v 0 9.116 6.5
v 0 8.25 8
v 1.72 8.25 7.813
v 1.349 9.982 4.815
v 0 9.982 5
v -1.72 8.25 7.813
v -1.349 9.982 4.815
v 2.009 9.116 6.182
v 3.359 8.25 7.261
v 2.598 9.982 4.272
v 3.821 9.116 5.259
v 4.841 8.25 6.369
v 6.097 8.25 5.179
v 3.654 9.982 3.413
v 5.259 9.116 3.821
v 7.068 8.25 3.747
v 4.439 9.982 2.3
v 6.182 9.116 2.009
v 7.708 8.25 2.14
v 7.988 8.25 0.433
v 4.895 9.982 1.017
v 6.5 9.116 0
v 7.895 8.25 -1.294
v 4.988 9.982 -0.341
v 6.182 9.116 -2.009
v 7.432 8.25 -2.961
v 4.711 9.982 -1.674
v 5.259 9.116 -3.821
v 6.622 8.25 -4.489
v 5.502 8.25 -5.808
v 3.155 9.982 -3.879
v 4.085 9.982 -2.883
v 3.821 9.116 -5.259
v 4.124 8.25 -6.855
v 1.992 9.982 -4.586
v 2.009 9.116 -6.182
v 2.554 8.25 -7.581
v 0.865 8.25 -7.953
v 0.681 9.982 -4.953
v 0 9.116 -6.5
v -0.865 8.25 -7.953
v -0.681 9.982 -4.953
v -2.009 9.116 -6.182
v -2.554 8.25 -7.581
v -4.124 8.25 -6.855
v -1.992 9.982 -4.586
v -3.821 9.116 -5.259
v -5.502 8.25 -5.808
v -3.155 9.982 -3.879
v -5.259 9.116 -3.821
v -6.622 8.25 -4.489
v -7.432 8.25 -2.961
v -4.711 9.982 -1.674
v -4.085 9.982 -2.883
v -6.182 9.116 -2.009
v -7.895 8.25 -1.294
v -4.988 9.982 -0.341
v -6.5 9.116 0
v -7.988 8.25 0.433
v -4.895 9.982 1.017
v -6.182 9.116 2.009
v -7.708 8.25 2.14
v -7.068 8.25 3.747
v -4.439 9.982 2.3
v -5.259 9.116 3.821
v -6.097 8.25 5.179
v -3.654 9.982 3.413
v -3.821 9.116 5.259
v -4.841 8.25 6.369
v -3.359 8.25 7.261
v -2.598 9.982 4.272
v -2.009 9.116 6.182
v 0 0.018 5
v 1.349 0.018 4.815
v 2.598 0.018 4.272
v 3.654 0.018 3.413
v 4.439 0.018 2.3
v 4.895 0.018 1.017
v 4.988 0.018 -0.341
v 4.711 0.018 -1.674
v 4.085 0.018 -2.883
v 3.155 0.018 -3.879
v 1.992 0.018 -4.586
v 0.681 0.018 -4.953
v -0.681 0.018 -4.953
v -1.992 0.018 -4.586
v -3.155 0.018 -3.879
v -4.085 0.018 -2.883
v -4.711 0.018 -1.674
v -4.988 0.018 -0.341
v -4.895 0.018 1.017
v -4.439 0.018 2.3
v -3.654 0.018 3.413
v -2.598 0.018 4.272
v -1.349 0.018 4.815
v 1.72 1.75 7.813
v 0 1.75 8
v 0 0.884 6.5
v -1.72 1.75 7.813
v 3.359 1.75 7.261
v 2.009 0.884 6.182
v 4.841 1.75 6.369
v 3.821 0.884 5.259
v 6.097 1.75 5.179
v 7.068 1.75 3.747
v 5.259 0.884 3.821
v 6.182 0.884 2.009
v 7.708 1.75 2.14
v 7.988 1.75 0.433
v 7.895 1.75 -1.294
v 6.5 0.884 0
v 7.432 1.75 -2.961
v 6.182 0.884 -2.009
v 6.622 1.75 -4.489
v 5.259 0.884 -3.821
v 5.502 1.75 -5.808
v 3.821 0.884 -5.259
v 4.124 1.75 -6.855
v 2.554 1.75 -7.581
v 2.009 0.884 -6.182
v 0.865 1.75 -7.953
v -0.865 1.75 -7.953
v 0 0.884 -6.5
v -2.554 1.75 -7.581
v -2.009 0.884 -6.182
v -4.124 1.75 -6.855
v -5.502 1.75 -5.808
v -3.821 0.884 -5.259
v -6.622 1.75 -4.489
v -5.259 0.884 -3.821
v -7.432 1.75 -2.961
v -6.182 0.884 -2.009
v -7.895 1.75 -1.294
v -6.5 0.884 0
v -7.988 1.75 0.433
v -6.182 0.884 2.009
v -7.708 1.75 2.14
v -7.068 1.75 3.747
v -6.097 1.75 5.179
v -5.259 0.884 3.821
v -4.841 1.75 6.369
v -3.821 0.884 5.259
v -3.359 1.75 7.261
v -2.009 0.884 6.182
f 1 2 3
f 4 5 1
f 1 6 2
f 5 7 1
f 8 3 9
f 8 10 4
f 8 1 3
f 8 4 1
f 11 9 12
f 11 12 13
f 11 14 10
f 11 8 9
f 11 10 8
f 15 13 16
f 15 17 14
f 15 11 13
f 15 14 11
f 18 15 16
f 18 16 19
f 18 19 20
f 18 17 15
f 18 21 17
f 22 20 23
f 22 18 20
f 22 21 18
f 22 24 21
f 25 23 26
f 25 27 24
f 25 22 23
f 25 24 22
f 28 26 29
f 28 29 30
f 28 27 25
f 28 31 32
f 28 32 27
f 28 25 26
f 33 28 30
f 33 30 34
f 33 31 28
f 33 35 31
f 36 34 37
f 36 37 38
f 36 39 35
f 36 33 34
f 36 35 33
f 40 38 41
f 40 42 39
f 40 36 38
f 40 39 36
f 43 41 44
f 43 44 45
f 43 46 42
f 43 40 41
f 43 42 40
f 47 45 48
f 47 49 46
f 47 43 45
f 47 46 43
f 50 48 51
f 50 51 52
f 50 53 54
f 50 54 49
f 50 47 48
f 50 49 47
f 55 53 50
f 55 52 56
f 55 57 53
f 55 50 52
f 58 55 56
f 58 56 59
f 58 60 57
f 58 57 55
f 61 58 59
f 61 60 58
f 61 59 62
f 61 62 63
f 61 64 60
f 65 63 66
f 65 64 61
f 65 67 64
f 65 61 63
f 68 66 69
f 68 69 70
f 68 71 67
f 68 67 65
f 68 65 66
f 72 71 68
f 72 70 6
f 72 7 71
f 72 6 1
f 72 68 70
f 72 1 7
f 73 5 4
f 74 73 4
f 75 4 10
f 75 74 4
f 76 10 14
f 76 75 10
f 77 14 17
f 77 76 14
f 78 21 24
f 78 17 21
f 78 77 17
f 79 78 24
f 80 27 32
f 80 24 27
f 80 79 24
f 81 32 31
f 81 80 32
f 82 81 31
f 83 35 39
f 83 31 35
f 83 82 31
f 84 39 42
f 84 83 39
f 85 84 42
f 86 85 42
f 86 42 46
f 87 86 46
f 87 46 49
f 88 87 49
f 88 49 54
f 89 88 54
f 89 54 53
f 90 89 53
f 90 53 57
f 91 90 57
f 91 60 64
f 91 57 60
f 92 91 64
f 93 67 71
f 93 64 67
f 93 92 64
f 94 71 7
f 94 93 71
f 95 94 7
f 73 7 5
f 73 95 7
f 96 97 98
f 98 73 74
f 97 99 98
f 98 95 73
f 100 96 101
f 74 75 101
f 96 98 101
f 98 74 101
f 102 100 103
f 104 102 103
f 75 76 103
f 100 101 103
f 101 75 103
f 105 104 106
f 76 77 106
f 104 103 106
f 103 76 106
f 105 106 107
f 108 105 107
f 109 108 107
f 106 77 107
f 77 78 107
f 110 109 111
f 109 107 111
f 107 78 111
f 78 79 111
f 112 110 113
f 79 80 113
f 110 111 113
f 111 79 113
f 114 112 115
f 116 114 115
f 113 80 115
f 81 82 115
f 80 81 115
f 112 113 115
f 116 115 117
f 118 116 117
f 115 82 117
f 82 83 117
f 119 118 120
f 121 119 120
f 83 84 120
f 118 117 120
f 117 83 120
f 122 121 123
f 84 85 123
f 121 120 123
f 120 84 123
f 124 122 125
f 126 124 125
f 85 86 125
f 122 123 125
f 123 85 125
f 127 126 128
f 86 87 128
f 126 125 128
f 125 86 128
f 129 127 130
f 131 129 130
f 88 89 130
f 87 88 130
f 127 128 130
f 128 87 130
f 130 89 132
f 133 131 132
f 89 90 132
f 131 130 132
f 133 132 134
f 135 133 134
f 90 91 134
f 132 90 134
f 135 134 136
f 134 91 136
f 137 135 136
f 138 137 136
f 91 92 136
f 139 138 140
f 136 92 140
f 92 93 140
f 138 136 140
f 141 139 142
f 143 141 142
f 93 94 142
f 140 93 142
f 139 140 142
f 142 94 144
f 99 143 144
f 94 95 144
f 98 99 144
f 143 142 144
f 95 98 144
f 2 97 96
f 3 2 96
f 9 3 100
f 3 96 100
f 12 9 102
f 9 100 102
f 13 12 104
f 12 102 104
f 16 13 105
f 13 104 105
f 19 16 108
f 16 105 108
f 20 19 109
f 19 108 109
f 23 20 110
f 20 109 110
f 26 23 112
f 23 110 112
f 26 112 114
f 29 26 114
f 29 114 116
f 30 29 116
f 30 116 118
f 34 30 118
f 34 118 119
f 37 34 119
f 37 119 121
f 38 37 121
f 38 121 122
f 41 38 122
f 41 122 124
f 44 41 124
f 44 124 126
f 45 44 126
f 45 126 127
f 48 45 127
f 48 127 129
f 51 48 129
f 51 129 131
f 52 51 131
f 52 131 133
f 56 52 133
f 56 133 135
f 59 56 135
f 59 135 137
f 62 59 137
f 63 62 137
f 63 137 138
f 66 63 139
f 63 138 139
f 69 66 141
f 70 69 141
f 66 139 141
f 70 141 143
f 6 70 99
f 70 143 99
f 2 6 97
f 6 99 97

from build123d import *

# Parameters (mm, degrees)
SKETCH2_R           = 8
SKETCH2_R_2         = 5
BOSS_EXTRUDE1_DEPTH = 10
CHAMFER3_SIZE       = 1.75
CHAMFER3_SIZE_2     = 3.031088913
CHAMFER4_SIZE       = 1.75
CHAMFER4_SIZE_2     = 3.031088913


with BuildPart() as part:
    # Sketch2 → Boss-Extrude1 (new body)
    with BuildSketch(Plane(origin=(0, 0, 0), x_dir=(1, 0, 0), z_dir=(0, 1, 0))):
        with Locations(Location((0, 0, 0), (0, 0, 270))):
            Circle(SKETCH2_R)
        with Locations(Location((0, 0, 0), (0, 0, 270))):
            Circle(SKETCH2_R_2, mode=Mode.SUBTRACT)
    extrude(amount=BOSS_EXTRUDE1_DEPTH)

    # Chamfer3
    # the kernel refuses this chamfer: 3.031088913, 1.75 mm, written as the material it takes off along each edge
    with BuildSketch(Plane(origin=(0, 10, 0), x_dir=(0, 0, 1), z_dir=(-1, 0, 0))) as chamfer3_piece_1:
        Polygon((8, -CHAMFER3_SIZE), (8 - CHAMFER3_SIZE_2, 0), (8, 0), align=None)
    revolve(axis=Axis((0, 10, 0), (0, 1, 0)), mode=Mode.SUBTRACT)

    # Chamfer4
    # the kernel refuses this chamfer: 3.031088913, 1.75 mm, written as the material it takes off along each edge
    with BuildSketch(Plane(origin=(0, 0, 0), x_dir=(0, 0, 1), z_dir=(-1, 0, 0))) as chamfer4_piece_1:
        Polygon((8, CHAMFER4_SIZE), (8 - CHAMFER4_SIZE_2, 0), (8, 0), align=None)
    revolve(axis=Axis((0, 0, 0), (0, 1, 0)), mode=Mode.SUBTRACT)


solid = part.part
